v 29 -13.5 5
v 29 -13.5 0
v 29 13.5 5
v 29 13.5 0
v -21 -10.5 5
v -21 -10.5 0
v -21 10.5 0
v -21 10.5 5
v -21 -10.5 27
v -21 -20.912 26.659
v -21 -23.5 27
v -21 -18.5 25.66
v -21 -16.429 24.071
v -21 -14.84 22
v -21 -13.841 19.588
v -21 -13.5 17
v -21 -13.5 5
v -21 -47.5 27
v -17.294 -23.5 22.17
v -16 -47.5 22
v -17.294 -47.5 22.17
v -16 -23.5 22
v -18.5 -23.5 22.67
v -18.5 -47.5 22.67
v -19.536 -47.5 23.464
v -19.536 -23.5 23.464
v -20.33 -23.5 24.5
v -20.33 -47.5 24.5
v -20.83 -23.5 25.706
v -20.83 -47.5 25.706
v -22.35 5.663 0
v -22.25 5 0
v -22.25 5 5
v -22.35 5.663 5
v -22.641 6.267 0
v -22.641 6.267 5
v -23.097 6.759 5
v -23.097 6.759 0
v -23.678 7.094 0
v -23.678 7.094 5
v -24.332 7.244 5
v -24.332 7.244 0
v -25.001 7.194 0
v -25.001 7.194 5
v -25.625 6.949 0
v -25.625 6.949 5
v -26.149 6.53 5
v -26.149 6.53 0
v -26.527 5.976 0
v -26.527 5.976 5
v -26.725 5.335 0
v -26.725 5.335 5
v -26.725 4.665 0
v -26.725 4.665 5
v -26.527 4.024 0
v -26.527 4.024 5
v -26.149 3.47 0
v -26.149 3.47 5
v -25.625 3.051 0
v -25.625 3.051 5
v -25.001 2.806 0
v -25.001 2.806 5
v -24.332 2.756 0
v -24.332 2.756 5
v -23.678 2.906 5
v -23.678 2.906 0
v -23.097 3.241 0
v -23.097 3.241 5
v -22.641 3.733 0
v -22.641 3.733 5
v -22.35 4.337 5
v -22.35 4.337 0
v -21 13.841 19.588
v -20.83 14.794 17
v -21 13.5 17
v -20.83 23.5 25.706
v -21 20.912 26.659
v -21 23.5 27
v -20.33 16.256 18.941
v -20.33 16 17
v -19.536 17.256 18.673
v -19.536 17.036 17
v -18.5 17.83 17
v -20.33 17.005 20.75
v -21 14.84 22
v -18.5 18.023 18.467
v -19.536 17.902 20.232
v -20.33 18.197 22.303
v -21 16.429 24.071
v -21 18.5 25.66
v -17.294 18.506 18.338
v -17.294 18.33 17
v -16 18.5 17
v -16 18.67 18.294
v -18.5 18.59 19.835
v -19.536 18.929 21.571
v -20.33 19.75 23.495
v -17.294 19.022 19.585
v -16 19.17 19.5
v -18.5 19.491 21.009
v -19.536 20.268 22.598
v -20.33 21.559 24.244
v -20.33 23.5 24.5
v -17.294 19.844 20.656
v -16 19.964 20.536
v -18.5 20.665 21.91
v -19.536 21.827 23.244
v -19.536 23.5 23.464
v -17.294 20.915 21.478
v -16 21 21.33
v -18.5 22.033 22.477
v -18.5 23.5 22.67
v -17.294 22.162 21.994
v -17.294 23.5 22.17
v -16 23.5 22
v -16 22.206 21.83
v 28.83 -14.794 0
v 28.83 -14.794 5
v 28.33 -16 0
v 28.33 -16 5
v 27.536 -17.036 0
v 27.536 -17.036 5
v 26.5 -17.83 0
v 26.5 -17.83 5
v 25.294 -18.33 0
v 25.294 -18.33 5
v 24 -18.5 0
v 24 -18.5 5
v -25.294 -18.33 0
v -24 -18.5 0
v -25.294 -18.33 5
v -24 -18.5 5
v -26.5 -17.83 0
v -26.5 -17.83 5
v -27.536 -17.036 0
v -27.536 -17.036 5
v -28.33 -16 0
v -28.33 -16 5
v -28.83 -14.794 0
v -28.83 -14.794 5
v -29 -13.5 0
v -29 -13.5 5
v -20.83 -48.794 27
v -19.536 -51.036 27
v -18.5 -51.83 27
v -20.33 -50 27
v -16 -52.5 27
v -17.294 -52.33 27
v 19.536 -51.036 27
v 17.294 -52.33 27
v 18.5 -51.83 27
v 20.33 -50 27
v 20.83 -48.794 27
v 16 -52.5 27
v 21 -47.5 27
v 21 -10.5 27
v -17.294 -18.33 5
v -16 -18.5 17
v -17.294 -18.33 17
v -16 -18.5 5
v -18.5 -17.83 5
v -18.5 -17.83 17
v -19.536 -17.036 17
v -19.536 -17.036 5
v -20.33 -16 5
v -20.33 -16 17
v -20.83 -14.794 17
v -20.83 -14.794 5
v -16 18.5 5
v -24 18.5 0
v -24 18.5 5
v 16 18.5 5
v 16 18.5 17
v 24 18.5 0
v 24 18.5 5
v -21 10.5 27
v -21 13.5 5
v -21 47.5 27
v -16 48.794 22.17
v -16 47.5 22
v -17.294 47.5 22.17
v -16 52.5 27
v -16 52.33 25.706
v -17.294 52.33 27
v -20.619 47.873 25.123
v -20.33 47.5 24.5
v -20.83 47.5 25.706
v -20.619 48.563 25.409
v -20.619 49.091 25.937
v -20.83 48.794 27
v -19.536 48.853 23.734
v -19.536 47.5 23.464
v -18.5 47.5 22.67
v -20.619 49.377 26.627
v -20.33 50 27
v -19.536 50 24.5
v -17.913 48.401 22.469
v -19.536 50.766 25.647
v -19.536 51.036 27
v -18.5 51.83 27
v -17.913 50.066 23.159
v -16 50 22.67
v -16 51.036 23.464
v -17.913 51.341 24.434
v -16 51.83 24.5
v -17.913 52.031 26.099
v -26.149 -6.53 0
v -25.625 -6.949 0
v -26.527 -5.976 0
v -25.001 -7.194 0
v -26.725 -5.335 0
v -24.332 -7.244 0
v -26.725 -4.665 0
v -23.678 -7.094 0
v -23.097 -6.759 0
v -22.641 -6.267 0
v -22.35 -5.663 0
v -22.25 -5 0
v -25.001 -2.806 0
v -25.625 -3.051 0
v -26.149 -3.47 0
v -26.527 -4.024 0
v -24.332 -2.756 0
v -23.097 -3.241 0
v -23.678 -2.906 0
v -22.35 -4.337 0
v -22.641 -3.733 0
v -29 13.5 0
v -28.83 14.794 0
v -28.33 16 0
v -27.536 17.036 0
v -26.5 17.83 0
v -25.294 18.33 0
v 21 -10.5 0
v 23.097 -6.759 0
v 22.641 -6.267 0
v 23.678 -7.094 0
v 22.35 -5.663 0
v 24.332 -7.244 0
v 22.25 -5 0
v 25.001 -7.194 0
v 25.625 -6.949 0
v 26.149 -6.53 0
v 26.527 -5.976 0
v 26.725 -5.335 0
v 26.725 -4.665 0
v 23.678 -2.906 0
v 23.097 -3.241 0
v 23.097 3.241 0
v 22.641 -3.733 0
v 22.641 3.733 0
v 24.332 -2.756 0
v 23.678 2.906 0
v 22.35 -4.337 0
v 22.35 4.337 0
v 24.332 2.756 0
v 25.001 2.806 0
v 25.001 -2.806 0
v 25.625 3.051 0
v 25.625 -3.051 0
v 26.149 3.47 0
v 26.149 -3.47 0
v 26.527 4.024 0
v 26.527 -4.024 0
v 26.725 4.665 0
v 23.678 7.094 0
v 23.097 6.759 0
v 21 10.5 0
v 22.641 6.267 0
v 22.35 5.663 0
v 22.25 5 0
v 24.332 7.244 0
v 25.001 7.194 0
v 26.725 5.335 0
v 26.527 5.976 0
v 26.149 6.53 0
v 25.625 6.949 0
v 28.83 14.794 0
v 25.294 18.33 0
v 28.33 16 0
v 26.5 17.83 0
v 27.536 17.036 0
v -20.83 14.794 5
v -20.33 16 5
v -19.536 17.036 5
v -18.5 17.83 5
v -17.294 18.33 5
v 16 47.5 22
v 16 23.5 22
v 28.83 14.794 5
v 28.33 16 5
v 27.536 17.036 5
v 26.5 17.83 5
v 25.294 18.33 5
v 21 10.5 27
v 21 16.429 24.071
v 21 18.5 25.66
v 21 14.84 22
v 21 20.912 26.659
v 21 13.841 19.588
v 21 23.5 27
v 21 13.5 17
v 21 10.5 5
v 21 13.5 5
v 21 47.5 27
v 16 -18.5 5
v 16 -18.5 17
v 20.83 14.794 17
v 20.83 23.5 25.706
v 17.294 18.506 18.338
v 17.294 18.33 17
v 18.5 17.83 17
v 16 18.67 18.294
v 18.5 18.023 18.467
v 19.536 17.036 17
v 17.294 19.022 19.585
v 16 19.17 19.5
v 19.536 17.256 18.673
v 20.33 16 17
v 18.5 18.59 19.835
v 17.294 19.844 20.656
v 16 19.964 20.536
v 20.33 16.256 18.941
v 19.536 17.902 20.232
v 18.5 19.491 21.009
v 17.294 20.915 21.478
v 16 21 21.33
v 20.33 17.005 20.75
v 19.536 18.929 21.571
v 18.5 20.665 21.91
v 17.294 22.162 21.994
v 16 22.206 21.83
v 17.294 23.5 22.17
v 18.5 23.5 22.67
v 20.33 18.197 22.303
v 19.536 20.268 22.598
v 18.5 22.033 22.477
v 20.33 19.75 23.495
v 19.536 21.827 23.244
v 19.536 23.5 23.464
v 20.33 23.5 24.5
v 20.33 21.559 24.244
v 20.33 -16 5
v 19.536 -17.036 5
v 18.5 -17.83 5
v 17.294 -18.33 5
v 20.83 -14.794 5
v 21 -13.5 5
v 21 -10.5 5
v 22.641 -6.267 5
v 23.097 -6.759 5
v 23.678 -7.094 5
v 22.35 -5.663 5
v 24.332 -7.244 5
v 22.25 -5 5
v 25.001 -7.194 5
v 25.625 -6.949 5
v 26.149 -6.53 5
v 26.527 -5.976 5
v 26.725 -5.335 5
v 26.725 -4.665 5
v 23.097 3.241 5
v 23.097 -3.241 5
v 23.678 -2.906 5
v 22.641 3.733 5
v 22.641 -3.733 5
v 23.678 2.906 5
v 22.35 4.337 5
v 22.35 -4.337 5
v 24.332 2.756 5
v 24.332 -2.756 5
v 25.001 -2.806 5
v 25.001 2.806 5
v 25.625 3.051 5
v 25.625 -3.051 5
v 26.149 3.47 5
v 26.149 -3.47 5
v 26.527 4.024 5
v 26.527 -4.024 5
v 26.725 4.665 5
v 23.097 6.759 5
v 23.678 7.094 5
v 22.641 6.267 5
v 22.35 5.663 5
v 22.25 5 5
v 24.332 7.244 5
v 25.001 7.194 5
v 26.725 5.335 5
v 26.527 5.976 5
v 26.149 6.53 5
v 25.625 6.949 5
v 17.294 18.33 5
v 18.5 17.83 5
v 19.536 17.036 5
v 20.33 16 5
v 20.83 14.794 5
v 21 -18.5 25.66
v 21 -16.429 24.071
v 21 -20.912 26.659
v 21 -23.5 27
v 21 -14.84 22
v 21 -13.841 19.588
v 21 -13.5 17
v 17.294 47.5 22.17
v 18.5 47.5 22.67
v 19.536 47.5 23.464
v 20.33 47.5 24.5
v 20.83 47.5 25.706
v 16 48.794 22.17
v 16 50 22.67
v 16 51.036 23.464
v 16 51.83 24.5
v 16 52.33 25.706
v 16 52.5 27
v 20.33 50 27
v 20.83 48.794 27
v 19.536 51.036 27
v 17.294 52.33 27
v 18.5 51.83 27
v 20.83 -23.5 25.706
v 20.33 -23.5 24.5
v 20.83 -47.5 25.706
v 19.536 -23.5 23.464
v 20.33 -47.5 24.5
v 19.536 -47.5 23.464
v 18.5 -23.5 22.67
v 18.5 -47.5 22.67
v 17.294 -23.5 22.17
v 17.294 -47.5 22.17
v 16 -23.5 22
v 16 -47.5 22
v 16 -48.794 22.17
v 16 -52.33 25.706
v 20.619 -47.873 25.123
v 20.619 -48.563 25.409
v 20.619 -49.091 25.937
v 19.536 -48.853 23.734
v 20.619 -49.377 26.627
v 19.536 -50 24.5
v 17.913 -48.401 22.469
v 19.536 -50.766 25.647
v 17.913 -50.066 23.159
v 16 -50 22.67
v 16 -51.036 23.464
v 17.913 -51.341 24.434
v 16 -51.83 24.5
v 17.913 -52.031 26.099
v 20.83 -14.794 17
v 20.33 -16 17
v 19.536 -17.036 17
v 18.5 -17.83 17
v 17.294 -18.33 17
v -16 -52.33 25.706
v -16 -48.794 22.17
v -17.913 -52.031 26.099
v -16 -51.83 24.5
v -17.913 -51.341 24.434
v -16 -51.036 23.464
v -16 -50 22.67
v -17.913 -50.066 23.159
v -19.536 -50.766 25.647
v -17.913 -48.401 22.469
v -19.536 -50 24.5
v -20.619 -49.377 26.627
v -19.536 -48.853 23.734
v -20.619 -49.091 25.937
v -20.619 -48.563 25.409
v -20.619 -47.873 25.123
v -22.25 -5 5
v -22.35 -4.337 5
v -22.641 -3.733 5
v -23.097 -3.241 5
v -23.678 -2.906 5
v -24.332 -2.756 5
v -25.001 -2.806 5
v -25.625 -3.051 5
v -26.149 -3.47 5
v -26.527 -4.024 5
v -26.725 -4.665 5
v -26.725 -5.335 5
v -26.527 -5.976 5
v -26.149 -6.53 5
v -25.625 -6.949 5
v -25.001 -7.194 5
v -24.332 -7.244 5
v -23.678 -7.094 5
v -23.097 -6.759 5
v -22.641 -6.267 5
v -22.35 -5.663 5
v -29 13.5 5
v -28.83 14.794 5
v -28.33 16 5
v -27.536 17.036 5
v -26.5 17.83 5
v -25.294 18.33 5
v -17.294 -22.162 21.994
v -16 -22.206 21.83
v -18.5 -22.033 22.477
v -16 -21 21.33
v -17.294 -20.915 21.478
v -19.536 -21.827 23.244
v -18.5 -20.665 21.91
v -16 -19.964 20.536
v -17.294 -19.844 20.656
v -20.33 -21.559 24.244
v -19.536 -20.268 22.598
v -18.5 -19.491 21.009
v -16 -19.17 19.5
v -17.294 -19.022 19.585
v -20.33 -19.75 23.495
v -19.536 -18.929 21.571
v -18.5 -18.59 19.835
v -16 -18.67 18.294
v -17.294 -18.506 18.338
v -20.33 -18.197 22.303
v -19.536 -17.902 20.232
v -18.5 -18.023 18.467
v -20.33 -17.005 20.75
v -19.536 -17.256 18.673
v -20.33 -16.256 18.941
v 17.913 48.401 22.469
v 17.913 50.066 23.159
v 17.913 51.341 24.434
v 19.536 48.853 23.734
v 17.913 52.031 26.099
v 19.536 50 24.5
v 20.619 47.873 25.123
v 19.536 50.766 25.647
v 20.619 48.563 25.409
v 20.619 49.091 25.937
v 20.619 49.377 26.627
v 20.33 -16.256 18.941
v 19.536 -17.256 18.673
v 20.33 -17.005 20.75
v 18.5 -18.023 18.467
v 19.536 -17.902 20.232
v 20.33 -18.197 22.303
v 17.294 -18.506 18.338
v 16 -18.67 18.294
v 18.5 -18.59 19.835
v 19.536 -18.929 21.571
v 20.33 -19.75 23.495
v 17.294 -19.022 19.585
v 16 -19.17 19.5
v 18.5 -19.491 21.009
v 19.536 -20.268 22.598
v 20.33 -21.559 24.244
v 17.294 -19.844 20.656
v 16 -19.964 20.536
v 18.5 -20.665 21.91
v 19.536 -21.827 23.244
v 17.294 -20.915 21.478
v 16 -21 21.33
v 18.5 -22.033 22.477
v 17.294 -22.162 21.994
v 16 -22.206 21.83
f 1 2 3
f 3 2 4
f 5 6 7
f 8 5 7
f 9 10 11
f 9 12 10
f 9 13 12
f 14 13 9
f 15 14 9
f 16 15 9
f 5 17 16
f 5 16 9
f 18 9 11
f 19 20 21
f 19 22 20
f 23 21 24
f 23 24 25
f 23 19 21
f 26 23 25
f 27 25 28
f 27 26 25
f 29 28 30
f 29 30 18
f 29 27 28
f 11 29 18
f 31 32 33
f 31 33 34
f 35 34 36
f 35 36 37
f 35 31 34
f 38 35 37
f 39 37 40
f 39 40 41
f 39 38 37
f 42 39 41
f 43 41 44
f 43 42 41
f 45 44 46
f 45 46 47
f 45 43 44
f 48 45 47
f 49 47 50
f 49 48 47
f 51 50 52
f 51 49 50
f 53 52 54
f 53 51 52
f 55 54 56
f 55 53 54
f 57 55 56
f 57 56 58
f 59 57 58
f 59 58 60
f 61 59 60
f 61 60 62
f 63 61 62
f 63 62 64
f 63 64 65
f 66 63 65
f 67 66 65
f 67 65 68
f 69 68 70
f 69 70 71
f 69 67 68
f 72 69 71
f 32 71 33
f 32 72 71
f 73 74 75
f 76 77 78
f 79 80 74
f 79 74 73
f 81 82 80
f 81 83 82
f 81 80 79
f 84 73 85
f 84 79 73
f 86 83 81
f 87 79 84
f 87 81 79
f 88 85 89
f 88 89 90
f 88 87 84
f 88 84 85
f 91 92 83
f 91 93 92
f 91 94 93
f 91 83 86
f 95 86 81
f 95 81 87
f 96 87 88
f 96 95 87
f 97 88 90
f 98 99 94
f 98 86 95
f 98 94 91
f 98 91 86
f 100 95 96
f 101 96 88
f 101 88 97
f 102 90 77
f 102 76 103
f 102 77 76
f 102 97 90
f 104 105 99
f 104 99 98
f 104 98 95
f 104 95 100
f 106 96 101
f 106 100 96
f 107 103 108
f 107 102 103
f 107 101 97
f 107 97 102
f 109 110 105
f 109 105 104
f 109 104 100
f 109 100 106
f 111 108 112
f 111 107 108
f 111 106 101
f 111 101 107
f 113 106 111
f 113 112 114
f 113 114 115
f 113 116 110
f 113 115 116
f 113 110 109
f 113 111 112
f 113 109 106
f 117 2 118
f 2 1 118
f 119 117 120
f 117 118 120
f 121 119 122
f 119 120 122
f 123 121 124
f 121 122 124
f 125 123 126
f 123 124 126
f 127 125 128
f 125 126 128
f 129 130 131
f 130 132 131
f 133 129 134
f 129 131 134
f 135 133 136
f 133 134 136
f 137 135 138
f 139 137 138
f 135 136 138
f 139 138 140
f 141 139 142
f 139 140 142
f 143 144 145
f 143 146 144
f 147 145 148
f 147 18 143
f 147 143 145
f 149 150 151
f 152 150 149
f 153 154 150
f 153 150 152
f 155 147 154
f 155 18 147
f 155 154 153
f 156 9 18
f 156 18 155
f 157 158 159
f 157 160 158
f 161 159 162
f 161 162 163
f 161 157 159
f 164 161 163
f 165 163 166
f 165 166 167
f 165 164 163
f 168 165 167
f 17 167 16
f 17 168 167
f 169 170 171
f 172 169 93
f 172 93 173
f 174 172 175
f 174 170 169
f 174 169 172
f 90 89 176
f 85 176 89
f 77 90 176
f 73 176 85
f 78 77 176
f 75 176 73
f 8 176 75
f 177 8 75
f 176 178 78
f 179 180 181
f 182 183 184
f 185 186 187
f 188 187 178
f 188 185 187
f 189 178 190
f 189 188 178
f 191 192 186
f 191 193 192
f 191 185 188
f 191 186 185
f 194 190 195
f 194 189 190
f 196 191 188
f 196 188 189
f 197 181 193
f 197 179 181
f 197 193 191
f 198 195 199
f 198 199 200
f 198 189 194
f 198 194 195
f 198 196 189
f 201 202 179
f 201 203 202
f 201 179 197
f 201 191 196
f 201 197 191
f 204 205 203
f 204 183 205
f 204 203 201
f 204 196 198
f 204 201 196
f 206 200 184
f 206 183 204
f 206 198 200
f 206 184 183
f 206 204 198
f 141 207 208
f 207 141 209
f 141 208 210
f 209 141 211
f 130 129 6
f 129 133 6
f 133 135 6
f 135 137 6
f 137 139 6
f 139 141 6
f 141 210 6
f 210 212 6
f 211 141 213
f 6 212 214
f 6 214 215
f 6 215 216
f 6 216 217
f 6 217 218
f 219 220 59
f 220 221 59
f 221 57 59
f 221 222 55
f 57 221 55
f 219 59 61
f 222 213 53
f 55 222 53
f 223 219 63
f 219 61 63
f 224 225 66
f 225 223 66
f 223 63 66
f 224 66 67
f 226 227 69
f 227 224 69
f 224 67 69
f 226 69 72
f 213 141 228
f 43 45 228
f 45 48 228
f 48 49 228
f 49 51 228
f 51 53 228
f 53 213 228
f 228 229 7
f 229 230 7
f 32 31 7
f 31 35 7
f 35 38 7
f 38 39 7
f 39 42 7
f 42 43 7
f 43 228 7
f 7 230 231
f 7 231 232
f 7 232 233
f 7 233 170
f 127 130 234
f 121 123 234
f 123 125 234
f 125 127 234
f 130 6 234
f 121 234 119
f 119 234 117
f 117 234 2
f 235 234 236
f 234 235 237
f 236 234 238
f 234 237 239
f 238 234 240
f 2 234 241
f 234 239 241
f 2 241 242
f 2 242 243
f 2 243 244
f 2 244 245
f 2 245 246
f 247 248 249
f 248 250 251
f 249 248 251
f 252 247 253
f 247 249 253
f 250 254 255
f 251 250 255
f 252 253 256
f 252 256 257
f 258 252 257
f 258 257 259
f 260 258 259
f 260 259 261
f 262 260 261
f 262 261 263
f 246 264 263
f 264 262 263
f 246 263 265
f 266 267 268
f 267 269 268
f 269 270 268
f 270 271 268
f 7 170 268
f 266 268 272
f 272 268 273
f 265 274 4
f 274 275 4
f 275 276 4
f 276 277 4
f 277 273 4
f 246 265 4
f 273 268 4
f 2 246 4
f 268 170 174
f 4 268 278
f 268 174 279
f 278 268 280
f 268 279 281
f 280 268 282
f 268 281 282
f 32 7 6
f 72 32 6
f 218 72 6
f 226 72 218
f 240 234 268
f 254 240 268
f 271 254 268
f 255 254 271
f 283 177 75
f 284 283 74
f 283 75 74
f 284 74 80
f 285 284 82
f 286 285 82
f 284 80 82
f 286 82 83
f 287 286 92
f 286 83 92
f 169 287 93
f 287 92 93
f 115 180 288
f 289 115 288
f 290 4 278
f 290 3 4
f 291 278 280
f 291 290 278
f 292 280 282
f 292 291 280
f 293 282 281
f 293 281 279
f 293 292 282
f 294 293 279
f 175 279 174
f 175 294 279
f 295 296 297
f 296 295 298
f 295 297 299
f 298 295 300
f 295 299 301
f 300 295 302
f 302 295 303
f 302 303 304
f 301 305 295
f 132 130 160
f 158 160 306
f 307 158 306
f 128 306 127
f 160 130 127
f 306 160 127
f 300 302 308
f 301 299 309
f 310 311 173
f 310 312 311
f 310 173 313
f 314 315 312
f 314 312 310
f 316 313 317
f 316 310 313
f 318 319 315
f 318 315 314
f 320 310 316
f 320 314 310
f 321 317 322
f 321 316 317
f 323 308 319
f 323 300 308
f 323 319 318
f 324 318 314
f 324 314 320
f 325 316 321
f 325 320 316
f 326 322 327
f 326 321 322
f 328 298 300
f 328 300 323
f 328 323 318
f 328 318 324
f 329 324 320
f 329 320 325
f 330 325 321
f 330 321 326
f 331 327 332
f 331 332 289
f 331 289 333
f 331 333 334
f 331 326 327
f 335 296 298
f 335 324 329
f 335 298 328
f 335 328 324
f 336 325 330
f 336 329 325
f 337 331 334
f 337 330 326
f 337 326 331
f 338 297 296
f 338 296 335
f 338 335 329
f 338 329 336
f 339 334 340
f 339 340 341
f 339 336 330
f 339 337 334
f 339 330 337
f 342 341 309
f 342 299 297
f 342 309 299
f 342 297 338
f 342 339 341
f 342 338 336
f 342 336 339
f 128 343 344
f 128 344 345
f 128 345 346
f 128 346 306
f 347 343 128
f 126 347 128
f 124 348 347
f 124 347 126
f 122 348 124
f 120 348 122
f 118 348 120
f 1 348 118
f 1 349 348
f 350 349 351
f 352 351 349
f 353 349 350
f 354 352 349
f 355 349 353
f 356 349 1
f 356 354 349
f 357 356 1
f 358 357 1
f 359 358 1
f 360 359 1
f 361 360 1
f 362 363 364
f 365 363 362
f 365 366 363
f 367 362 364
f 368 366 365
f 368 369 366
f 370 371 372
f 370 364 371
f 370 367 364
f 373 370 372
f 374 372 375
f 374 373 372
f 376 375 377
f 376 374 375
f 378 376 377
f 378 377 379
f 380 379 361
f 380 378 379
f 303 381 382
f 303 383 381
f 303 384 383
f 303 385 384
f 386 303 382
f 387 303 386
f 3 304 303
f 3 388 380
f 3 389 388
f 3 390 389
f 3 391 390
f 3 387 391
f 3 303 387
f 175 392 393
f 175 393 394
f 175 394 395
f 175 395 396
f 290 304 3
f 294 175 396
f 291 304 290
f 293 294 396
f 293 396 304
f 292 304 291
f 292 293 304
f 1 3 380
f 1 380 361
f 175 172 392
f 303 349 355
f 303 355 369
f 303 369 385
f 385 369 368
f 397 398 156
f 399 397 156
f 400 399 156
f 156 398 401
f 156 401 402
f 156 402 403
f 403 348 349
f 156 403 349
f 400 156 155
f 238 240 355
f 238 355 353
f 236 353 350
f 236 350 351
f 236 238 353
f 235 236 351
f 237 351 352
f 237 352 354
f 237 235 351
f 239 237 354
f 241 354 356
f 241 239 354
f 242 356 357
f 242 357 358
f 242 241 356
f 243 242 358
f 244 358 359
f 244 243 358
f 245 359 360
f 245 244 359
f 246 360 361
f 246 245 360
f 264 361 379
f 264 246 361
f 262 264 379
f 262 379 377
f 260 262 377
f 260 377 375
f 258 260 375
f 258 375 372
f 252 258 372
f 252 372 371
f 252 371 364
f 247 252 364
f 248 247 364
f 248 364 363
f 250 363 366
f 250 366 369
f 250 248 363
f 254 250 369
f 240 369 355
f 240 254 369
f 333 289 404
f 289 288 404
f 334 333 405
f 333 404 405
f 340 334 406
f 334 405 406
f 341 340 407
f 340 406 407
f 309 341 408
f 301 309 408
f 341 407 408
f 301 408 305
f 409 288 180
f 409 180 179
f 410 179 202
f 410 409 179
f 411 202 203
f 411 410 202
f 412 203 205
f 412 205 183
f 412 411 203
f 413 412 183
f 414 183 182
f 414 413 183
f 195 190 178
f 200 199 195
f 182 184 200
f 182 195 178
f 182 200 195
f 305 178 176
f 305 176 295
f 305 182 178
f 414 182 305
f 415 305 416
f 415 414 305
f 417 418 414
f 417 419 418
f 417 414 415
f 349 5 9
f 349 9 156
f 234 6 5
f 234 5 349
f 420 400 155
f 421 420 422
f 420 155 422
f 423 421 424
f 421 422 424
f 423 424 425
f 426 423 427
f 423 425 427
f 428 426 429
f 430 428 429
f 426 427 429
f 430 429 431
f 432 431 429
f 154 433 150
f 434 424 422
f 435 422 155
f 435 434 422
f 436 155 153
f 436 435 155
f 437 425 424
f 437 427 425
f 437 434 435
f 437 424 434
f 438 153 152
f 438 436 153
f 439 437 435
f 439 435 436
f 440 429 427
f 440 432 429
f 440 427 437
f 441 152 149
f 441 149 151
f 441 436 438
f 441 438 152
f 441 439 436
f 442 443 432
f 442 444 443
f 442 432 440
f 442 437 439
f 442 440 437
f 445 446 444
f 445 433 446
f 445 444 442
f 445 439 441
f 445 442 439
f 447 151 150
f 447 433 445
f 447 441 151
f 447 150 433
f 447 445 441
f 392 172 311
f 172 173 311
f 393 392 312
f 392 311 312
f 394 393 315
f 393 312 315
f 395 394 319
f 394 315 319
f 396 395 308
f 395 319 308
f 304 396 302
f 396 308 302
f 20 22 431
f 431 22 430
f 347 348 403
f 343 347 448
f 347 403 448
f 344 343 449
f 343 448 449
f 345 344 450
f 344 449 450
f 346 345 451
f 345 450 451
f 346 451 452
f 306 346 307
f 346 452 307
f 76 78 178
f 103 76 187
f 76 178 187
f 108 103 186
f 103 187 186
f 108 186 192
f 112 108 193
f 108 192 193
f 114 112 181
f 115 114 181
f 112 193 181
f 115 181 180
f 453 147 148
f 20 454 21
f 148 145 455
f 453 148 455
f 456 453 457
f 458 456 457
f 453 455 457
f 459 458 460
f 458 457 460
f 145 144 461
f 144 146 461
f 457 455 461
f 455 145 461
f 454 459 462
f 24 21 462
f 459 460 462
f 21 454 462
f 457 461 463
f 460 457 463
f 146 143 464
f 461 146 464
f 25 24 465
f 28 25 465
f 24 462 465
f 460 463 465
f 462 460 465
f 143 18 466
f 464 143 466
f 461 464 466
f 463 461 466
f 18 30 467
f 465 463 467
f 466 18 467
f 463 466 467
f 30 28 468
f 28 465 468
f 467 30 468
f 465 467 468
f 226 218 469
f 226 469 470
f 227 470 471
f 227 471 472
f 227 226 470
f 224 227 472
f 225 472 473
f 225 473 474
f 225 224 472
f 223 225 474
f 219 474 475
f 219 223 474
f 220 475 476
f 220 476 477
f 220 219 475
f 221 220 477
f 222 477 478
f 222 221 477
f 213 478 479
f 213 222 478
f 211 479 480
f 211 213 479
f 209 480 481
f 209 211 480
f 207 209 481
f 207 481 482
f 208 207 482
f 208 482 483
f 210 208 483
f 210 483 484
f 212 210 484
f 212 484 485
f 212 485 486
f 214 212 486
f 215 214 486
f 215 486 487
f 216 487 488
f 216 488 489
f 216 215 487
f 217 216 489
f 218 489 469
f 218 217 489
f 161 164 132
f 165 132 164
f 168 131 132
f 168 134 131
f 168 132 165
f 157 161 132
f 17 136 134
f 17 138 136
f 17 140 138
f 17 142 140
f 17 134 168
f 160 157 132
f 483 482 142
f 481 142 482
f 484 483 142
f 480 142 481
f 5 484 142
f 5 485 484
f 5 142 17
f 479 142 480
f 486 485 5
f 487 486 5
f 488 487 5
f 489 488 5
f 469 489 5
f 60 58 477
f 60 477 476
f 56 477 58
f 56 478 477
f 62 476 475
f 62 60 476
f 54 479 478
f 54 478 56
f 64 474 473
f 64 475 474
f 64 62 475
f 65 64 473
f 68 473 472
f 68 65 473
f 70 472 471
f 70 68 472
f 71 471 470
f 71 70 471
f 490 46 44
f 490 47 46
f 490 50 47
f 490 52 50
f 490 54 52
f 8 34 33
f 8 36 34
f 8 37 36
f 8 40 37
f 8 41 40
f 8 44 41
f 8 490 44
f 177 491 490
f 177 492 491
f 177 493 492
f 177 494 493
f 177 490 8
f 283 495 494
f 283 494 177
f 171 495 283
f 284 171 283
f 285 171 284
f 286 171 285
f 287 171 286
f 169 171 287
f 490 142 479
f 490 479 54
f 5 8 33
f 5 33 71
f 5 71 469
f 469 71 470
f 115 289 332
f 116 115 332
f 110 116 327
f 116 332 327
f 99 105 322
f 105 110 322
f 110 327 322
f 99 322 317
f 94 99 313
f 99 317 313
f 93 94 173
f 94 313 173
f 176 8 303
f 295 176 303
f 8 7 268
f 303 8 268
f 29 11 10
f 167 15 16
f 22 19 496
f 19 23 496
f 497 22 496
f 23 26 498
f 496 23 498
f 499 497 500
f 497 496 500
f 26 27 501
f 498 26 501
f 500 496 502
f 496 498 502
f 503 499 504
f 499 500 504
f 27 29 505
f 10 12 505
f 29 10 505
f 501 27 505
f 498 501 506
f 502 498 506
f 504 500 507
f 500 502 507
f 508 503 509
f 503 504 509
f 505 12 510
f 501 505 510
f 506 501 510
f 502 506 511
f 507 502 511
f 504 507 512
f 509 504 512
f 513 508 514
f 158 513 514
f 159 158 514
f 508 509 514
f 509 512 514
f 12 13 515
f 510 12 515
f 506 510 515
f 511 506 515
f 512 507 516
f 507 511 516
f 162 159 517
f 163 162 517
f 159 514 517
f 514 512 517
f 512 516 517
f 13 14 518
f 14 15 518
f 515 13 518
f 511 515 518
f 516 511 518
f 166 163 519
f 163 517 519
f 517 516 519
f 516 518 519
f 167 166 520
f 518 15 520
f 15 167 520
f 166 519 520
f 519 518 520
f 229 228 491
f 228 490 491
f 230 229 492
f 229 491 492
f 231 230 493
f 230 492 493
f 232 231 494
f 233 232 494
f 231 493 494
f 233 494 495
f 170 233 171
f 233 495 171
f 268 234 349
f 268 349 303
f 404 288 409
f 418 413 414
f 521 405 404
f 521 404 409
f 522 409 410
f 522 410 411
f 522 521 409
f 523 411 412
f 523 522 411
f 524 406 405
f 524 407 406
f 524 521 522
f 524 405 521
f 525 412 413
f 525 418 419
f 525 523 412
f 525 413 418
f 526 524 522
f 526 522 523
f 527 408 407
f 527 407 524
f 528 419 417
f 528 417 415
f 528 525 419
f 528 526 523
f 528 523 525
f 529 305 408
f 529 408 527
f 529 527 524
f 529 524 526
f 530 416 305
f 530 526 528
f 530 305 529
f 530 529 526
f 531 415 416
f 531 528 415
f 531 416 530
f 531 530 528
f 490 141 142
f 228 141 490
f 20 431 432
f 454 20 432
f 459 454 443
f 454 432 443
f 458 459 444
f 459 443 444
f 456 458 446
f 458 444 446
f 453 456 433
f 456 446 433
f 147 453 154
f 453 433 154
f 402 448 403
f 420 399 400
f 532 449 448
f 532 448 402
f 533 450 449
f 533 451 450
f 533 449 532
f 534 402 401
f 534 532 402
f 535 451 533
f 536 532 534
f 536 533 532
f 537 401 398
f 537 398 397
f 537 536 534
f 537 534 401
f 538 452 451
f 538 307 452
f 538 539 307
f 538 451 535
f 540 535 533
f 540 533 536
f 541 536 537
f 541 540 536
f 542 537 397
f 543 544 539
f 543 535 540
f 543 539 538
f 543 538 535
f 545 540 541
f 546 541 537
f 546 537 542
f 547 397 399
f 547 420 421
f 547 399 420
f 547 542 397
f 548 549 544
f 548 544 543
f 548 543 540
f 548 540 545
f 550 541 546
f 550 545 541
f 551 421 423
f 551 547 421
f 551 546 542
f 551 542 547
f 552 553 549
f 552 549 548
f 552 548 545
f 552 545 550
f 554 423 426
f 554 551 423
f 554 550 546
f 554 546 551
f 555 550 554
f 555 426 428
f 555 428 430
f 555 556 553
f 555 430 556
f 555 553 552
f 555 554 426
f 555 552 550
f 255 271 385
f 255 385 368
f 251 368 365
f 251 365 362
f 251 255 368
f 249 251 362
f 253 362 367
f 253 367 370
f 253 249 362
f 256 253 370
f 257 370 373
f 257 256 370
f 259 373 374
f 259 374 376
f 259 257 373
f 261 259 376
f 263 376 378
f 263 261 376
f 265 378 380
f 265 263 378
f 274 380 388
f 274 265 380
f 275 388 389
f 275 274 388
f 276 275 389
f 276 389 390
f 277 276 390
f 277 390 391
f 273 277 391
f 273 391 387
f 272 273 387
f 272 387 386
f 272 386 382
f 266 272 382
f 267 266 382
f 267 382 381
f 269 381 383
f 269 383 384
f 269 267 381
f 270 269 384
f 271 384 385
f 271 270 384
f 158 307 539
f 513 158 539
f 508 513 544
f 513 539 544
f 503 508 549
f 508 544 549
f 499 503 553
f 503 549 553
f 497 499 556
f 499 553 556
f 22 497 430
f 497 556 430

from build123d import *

# Parameters (mm, degrees)
SKETCH1_W           = 58
SKETCH1_H           = 37
SKETCH1_R           = 2.25
SKETCH1_W_2         = 42
SKETCH1_H_2         = 21
BOSS_EXTRUDE1_DEPTH = 5
SKETCH2_W           = 42
SKETCH2_H           = 8
BOSS_EXTRUDE2_DEPTH = 17
SKETCH3_W           = 42
SKETCH3_H           = 42
BOSS_EXTRUDE3_DEPTH = 5
FILLET1_R           = 5
FILLET2_R           = 5
FILLET3_R           = 5
FILLET4_R           = 5
FILLET5_R           = 5
FILLET6_R           = 5
FILLET7_R           = 5


with BuildPart() as part:
    # Sketch1 → Boss-Extrude1 (new body)
    with BuildSketch(Plane.XY):
        Rectangle(SKETCH1_W, SKETCH1_H)
        with Locations((-24.5, 5)):
            Circle(SKETCH1_R, mode=Mode.SUBTRACT)
        with Locations((-24.5, -5)):
            Circle(SKETCH1_R, mode=Mode.SUBTRACT)
        with Locations(Location((24.5, 5, 0), (0, 0, 180))):
            Circle(SKETCH1_R, mode=Mode.SUBTRACT)
        with Locations(Location((24.5, -5, 0), (0, 0, 180))):
            Circle(SKETCH1_R, mode=Mode.SUBTRACT)
        Rectangle(SKETCH1_W_2, SKETCH1_H_2, mode=Mode.SUBTRACT)
    extrude(amount=BOSS_EXTRUDE1_DEPTH)

    # Sketch2 → Boss-Extrude2 (add)
    with BuildSketch(Plane.XY.offset(5)):
        with Locations((0, 14.5)):
            Rectangle(SKETCH2_W, SKETCH2_H)
        with Locations((0, -14.5)):
            Rectangle(SKETCH2_W, SKETCH2_H)
    extrude(amount=BOSS_EXTRUDE2_DEPTH)

    # Sketch3 → Boss-Extrude3 (add)
    with BuildSketch(Plane.XY.offset(22)):
        with Locations((0, -31.5)):
            Rectangle(SKETCH3_W, SKETCH3_H)
        with Locations((0, 31.5)):
            Rectangle(SKETCH3_W, SKETCH3_H)
    extrude(amount=BOSS_EXTRUDE3_DEPTH)

    # Fillet1
    fillet1_edges = [part.edges().sort_by_distance(p)[0] for p in [
        (0, 18.5, 22),
    ]]
    fillet(fillet1_edges, radius=FILLET1_R)

    # Fillet2
    fillet2_edges = [part.edges().sort_by_distance(p)[0] for p in [
        (0, -18.5, 22),
    ]]
    fillet(fillet2_edges, radius=FILLET2_R)

    # Fillet3
    fillet3_edges = [part.edges().sort_by_distance(p)[0] for p in [
        (0, 52.5, 22),
    ]]
    fillet(fillet3_edges, radius=FILLET3_R - 0.0001)  # a hair under: the kernel refuses the full size

    # Fillet4
    fillet4_edges = [part.edges().sort_by_distance(p)[0] for p in [
        (0, -52.5, 22),
    ]]
    fillet(fillet4_edges, radius=FILLET4_R - 0.0001)  # a hair under: the kernel refuses the full size

    # Fillet5
    fillet5_edges = [part.edges().sort_by_distance(p)[0] for p in [
        (-21, 51.035563195, 23.464436805),
        (-21, 18.5, 11),
        (-21, 19.964466094, 20.535533906),
        (21, 18.5, 11),
        (21, 19.964466094, 20.535533906),
        (21, 51.035563195, 23.464436805),
        (-21, 35.50005, 22),
        (21, 35.50005, 22),
    ]]
    fillet(fillet5_edges, radius=FILLET5_R - 0.0001)  # a hair under: the kernel refuses the full size

    # Fillet6
    fillet6_edges = [part.edges().sort_by_distance(p)[0] for p in [
        (-21, -35.50005, 22),
        (21, -18.5, 11),
        (-21, -18.5, 11),
        (21, -19.964466094, 20.535533906),
        (-21, -19.964466094, 20.535533906),
        (21, -35.50005, 22),
        (21, -51.035563195, 23.464436805),
        (-21, -51.035563195, 23.464436805),
    ]]
    fillet(fillet6_edges, radius=FILLET6_R - 0.0001)  # a hair under: the kernel refuses the full size

    # Fillet7
    fillet7_edges = [part.edges().sort_by_distance(p)[0] for p in [
        (-29, 18.5, 2.5),
        (-29, -18.5, 2.5),
        (29, -18.5, 2.5),
        (29, 18.5, 2.5),
    ]]
    fillet(fillet7_edges, radius=FILLET7_R)


solid = part.part
